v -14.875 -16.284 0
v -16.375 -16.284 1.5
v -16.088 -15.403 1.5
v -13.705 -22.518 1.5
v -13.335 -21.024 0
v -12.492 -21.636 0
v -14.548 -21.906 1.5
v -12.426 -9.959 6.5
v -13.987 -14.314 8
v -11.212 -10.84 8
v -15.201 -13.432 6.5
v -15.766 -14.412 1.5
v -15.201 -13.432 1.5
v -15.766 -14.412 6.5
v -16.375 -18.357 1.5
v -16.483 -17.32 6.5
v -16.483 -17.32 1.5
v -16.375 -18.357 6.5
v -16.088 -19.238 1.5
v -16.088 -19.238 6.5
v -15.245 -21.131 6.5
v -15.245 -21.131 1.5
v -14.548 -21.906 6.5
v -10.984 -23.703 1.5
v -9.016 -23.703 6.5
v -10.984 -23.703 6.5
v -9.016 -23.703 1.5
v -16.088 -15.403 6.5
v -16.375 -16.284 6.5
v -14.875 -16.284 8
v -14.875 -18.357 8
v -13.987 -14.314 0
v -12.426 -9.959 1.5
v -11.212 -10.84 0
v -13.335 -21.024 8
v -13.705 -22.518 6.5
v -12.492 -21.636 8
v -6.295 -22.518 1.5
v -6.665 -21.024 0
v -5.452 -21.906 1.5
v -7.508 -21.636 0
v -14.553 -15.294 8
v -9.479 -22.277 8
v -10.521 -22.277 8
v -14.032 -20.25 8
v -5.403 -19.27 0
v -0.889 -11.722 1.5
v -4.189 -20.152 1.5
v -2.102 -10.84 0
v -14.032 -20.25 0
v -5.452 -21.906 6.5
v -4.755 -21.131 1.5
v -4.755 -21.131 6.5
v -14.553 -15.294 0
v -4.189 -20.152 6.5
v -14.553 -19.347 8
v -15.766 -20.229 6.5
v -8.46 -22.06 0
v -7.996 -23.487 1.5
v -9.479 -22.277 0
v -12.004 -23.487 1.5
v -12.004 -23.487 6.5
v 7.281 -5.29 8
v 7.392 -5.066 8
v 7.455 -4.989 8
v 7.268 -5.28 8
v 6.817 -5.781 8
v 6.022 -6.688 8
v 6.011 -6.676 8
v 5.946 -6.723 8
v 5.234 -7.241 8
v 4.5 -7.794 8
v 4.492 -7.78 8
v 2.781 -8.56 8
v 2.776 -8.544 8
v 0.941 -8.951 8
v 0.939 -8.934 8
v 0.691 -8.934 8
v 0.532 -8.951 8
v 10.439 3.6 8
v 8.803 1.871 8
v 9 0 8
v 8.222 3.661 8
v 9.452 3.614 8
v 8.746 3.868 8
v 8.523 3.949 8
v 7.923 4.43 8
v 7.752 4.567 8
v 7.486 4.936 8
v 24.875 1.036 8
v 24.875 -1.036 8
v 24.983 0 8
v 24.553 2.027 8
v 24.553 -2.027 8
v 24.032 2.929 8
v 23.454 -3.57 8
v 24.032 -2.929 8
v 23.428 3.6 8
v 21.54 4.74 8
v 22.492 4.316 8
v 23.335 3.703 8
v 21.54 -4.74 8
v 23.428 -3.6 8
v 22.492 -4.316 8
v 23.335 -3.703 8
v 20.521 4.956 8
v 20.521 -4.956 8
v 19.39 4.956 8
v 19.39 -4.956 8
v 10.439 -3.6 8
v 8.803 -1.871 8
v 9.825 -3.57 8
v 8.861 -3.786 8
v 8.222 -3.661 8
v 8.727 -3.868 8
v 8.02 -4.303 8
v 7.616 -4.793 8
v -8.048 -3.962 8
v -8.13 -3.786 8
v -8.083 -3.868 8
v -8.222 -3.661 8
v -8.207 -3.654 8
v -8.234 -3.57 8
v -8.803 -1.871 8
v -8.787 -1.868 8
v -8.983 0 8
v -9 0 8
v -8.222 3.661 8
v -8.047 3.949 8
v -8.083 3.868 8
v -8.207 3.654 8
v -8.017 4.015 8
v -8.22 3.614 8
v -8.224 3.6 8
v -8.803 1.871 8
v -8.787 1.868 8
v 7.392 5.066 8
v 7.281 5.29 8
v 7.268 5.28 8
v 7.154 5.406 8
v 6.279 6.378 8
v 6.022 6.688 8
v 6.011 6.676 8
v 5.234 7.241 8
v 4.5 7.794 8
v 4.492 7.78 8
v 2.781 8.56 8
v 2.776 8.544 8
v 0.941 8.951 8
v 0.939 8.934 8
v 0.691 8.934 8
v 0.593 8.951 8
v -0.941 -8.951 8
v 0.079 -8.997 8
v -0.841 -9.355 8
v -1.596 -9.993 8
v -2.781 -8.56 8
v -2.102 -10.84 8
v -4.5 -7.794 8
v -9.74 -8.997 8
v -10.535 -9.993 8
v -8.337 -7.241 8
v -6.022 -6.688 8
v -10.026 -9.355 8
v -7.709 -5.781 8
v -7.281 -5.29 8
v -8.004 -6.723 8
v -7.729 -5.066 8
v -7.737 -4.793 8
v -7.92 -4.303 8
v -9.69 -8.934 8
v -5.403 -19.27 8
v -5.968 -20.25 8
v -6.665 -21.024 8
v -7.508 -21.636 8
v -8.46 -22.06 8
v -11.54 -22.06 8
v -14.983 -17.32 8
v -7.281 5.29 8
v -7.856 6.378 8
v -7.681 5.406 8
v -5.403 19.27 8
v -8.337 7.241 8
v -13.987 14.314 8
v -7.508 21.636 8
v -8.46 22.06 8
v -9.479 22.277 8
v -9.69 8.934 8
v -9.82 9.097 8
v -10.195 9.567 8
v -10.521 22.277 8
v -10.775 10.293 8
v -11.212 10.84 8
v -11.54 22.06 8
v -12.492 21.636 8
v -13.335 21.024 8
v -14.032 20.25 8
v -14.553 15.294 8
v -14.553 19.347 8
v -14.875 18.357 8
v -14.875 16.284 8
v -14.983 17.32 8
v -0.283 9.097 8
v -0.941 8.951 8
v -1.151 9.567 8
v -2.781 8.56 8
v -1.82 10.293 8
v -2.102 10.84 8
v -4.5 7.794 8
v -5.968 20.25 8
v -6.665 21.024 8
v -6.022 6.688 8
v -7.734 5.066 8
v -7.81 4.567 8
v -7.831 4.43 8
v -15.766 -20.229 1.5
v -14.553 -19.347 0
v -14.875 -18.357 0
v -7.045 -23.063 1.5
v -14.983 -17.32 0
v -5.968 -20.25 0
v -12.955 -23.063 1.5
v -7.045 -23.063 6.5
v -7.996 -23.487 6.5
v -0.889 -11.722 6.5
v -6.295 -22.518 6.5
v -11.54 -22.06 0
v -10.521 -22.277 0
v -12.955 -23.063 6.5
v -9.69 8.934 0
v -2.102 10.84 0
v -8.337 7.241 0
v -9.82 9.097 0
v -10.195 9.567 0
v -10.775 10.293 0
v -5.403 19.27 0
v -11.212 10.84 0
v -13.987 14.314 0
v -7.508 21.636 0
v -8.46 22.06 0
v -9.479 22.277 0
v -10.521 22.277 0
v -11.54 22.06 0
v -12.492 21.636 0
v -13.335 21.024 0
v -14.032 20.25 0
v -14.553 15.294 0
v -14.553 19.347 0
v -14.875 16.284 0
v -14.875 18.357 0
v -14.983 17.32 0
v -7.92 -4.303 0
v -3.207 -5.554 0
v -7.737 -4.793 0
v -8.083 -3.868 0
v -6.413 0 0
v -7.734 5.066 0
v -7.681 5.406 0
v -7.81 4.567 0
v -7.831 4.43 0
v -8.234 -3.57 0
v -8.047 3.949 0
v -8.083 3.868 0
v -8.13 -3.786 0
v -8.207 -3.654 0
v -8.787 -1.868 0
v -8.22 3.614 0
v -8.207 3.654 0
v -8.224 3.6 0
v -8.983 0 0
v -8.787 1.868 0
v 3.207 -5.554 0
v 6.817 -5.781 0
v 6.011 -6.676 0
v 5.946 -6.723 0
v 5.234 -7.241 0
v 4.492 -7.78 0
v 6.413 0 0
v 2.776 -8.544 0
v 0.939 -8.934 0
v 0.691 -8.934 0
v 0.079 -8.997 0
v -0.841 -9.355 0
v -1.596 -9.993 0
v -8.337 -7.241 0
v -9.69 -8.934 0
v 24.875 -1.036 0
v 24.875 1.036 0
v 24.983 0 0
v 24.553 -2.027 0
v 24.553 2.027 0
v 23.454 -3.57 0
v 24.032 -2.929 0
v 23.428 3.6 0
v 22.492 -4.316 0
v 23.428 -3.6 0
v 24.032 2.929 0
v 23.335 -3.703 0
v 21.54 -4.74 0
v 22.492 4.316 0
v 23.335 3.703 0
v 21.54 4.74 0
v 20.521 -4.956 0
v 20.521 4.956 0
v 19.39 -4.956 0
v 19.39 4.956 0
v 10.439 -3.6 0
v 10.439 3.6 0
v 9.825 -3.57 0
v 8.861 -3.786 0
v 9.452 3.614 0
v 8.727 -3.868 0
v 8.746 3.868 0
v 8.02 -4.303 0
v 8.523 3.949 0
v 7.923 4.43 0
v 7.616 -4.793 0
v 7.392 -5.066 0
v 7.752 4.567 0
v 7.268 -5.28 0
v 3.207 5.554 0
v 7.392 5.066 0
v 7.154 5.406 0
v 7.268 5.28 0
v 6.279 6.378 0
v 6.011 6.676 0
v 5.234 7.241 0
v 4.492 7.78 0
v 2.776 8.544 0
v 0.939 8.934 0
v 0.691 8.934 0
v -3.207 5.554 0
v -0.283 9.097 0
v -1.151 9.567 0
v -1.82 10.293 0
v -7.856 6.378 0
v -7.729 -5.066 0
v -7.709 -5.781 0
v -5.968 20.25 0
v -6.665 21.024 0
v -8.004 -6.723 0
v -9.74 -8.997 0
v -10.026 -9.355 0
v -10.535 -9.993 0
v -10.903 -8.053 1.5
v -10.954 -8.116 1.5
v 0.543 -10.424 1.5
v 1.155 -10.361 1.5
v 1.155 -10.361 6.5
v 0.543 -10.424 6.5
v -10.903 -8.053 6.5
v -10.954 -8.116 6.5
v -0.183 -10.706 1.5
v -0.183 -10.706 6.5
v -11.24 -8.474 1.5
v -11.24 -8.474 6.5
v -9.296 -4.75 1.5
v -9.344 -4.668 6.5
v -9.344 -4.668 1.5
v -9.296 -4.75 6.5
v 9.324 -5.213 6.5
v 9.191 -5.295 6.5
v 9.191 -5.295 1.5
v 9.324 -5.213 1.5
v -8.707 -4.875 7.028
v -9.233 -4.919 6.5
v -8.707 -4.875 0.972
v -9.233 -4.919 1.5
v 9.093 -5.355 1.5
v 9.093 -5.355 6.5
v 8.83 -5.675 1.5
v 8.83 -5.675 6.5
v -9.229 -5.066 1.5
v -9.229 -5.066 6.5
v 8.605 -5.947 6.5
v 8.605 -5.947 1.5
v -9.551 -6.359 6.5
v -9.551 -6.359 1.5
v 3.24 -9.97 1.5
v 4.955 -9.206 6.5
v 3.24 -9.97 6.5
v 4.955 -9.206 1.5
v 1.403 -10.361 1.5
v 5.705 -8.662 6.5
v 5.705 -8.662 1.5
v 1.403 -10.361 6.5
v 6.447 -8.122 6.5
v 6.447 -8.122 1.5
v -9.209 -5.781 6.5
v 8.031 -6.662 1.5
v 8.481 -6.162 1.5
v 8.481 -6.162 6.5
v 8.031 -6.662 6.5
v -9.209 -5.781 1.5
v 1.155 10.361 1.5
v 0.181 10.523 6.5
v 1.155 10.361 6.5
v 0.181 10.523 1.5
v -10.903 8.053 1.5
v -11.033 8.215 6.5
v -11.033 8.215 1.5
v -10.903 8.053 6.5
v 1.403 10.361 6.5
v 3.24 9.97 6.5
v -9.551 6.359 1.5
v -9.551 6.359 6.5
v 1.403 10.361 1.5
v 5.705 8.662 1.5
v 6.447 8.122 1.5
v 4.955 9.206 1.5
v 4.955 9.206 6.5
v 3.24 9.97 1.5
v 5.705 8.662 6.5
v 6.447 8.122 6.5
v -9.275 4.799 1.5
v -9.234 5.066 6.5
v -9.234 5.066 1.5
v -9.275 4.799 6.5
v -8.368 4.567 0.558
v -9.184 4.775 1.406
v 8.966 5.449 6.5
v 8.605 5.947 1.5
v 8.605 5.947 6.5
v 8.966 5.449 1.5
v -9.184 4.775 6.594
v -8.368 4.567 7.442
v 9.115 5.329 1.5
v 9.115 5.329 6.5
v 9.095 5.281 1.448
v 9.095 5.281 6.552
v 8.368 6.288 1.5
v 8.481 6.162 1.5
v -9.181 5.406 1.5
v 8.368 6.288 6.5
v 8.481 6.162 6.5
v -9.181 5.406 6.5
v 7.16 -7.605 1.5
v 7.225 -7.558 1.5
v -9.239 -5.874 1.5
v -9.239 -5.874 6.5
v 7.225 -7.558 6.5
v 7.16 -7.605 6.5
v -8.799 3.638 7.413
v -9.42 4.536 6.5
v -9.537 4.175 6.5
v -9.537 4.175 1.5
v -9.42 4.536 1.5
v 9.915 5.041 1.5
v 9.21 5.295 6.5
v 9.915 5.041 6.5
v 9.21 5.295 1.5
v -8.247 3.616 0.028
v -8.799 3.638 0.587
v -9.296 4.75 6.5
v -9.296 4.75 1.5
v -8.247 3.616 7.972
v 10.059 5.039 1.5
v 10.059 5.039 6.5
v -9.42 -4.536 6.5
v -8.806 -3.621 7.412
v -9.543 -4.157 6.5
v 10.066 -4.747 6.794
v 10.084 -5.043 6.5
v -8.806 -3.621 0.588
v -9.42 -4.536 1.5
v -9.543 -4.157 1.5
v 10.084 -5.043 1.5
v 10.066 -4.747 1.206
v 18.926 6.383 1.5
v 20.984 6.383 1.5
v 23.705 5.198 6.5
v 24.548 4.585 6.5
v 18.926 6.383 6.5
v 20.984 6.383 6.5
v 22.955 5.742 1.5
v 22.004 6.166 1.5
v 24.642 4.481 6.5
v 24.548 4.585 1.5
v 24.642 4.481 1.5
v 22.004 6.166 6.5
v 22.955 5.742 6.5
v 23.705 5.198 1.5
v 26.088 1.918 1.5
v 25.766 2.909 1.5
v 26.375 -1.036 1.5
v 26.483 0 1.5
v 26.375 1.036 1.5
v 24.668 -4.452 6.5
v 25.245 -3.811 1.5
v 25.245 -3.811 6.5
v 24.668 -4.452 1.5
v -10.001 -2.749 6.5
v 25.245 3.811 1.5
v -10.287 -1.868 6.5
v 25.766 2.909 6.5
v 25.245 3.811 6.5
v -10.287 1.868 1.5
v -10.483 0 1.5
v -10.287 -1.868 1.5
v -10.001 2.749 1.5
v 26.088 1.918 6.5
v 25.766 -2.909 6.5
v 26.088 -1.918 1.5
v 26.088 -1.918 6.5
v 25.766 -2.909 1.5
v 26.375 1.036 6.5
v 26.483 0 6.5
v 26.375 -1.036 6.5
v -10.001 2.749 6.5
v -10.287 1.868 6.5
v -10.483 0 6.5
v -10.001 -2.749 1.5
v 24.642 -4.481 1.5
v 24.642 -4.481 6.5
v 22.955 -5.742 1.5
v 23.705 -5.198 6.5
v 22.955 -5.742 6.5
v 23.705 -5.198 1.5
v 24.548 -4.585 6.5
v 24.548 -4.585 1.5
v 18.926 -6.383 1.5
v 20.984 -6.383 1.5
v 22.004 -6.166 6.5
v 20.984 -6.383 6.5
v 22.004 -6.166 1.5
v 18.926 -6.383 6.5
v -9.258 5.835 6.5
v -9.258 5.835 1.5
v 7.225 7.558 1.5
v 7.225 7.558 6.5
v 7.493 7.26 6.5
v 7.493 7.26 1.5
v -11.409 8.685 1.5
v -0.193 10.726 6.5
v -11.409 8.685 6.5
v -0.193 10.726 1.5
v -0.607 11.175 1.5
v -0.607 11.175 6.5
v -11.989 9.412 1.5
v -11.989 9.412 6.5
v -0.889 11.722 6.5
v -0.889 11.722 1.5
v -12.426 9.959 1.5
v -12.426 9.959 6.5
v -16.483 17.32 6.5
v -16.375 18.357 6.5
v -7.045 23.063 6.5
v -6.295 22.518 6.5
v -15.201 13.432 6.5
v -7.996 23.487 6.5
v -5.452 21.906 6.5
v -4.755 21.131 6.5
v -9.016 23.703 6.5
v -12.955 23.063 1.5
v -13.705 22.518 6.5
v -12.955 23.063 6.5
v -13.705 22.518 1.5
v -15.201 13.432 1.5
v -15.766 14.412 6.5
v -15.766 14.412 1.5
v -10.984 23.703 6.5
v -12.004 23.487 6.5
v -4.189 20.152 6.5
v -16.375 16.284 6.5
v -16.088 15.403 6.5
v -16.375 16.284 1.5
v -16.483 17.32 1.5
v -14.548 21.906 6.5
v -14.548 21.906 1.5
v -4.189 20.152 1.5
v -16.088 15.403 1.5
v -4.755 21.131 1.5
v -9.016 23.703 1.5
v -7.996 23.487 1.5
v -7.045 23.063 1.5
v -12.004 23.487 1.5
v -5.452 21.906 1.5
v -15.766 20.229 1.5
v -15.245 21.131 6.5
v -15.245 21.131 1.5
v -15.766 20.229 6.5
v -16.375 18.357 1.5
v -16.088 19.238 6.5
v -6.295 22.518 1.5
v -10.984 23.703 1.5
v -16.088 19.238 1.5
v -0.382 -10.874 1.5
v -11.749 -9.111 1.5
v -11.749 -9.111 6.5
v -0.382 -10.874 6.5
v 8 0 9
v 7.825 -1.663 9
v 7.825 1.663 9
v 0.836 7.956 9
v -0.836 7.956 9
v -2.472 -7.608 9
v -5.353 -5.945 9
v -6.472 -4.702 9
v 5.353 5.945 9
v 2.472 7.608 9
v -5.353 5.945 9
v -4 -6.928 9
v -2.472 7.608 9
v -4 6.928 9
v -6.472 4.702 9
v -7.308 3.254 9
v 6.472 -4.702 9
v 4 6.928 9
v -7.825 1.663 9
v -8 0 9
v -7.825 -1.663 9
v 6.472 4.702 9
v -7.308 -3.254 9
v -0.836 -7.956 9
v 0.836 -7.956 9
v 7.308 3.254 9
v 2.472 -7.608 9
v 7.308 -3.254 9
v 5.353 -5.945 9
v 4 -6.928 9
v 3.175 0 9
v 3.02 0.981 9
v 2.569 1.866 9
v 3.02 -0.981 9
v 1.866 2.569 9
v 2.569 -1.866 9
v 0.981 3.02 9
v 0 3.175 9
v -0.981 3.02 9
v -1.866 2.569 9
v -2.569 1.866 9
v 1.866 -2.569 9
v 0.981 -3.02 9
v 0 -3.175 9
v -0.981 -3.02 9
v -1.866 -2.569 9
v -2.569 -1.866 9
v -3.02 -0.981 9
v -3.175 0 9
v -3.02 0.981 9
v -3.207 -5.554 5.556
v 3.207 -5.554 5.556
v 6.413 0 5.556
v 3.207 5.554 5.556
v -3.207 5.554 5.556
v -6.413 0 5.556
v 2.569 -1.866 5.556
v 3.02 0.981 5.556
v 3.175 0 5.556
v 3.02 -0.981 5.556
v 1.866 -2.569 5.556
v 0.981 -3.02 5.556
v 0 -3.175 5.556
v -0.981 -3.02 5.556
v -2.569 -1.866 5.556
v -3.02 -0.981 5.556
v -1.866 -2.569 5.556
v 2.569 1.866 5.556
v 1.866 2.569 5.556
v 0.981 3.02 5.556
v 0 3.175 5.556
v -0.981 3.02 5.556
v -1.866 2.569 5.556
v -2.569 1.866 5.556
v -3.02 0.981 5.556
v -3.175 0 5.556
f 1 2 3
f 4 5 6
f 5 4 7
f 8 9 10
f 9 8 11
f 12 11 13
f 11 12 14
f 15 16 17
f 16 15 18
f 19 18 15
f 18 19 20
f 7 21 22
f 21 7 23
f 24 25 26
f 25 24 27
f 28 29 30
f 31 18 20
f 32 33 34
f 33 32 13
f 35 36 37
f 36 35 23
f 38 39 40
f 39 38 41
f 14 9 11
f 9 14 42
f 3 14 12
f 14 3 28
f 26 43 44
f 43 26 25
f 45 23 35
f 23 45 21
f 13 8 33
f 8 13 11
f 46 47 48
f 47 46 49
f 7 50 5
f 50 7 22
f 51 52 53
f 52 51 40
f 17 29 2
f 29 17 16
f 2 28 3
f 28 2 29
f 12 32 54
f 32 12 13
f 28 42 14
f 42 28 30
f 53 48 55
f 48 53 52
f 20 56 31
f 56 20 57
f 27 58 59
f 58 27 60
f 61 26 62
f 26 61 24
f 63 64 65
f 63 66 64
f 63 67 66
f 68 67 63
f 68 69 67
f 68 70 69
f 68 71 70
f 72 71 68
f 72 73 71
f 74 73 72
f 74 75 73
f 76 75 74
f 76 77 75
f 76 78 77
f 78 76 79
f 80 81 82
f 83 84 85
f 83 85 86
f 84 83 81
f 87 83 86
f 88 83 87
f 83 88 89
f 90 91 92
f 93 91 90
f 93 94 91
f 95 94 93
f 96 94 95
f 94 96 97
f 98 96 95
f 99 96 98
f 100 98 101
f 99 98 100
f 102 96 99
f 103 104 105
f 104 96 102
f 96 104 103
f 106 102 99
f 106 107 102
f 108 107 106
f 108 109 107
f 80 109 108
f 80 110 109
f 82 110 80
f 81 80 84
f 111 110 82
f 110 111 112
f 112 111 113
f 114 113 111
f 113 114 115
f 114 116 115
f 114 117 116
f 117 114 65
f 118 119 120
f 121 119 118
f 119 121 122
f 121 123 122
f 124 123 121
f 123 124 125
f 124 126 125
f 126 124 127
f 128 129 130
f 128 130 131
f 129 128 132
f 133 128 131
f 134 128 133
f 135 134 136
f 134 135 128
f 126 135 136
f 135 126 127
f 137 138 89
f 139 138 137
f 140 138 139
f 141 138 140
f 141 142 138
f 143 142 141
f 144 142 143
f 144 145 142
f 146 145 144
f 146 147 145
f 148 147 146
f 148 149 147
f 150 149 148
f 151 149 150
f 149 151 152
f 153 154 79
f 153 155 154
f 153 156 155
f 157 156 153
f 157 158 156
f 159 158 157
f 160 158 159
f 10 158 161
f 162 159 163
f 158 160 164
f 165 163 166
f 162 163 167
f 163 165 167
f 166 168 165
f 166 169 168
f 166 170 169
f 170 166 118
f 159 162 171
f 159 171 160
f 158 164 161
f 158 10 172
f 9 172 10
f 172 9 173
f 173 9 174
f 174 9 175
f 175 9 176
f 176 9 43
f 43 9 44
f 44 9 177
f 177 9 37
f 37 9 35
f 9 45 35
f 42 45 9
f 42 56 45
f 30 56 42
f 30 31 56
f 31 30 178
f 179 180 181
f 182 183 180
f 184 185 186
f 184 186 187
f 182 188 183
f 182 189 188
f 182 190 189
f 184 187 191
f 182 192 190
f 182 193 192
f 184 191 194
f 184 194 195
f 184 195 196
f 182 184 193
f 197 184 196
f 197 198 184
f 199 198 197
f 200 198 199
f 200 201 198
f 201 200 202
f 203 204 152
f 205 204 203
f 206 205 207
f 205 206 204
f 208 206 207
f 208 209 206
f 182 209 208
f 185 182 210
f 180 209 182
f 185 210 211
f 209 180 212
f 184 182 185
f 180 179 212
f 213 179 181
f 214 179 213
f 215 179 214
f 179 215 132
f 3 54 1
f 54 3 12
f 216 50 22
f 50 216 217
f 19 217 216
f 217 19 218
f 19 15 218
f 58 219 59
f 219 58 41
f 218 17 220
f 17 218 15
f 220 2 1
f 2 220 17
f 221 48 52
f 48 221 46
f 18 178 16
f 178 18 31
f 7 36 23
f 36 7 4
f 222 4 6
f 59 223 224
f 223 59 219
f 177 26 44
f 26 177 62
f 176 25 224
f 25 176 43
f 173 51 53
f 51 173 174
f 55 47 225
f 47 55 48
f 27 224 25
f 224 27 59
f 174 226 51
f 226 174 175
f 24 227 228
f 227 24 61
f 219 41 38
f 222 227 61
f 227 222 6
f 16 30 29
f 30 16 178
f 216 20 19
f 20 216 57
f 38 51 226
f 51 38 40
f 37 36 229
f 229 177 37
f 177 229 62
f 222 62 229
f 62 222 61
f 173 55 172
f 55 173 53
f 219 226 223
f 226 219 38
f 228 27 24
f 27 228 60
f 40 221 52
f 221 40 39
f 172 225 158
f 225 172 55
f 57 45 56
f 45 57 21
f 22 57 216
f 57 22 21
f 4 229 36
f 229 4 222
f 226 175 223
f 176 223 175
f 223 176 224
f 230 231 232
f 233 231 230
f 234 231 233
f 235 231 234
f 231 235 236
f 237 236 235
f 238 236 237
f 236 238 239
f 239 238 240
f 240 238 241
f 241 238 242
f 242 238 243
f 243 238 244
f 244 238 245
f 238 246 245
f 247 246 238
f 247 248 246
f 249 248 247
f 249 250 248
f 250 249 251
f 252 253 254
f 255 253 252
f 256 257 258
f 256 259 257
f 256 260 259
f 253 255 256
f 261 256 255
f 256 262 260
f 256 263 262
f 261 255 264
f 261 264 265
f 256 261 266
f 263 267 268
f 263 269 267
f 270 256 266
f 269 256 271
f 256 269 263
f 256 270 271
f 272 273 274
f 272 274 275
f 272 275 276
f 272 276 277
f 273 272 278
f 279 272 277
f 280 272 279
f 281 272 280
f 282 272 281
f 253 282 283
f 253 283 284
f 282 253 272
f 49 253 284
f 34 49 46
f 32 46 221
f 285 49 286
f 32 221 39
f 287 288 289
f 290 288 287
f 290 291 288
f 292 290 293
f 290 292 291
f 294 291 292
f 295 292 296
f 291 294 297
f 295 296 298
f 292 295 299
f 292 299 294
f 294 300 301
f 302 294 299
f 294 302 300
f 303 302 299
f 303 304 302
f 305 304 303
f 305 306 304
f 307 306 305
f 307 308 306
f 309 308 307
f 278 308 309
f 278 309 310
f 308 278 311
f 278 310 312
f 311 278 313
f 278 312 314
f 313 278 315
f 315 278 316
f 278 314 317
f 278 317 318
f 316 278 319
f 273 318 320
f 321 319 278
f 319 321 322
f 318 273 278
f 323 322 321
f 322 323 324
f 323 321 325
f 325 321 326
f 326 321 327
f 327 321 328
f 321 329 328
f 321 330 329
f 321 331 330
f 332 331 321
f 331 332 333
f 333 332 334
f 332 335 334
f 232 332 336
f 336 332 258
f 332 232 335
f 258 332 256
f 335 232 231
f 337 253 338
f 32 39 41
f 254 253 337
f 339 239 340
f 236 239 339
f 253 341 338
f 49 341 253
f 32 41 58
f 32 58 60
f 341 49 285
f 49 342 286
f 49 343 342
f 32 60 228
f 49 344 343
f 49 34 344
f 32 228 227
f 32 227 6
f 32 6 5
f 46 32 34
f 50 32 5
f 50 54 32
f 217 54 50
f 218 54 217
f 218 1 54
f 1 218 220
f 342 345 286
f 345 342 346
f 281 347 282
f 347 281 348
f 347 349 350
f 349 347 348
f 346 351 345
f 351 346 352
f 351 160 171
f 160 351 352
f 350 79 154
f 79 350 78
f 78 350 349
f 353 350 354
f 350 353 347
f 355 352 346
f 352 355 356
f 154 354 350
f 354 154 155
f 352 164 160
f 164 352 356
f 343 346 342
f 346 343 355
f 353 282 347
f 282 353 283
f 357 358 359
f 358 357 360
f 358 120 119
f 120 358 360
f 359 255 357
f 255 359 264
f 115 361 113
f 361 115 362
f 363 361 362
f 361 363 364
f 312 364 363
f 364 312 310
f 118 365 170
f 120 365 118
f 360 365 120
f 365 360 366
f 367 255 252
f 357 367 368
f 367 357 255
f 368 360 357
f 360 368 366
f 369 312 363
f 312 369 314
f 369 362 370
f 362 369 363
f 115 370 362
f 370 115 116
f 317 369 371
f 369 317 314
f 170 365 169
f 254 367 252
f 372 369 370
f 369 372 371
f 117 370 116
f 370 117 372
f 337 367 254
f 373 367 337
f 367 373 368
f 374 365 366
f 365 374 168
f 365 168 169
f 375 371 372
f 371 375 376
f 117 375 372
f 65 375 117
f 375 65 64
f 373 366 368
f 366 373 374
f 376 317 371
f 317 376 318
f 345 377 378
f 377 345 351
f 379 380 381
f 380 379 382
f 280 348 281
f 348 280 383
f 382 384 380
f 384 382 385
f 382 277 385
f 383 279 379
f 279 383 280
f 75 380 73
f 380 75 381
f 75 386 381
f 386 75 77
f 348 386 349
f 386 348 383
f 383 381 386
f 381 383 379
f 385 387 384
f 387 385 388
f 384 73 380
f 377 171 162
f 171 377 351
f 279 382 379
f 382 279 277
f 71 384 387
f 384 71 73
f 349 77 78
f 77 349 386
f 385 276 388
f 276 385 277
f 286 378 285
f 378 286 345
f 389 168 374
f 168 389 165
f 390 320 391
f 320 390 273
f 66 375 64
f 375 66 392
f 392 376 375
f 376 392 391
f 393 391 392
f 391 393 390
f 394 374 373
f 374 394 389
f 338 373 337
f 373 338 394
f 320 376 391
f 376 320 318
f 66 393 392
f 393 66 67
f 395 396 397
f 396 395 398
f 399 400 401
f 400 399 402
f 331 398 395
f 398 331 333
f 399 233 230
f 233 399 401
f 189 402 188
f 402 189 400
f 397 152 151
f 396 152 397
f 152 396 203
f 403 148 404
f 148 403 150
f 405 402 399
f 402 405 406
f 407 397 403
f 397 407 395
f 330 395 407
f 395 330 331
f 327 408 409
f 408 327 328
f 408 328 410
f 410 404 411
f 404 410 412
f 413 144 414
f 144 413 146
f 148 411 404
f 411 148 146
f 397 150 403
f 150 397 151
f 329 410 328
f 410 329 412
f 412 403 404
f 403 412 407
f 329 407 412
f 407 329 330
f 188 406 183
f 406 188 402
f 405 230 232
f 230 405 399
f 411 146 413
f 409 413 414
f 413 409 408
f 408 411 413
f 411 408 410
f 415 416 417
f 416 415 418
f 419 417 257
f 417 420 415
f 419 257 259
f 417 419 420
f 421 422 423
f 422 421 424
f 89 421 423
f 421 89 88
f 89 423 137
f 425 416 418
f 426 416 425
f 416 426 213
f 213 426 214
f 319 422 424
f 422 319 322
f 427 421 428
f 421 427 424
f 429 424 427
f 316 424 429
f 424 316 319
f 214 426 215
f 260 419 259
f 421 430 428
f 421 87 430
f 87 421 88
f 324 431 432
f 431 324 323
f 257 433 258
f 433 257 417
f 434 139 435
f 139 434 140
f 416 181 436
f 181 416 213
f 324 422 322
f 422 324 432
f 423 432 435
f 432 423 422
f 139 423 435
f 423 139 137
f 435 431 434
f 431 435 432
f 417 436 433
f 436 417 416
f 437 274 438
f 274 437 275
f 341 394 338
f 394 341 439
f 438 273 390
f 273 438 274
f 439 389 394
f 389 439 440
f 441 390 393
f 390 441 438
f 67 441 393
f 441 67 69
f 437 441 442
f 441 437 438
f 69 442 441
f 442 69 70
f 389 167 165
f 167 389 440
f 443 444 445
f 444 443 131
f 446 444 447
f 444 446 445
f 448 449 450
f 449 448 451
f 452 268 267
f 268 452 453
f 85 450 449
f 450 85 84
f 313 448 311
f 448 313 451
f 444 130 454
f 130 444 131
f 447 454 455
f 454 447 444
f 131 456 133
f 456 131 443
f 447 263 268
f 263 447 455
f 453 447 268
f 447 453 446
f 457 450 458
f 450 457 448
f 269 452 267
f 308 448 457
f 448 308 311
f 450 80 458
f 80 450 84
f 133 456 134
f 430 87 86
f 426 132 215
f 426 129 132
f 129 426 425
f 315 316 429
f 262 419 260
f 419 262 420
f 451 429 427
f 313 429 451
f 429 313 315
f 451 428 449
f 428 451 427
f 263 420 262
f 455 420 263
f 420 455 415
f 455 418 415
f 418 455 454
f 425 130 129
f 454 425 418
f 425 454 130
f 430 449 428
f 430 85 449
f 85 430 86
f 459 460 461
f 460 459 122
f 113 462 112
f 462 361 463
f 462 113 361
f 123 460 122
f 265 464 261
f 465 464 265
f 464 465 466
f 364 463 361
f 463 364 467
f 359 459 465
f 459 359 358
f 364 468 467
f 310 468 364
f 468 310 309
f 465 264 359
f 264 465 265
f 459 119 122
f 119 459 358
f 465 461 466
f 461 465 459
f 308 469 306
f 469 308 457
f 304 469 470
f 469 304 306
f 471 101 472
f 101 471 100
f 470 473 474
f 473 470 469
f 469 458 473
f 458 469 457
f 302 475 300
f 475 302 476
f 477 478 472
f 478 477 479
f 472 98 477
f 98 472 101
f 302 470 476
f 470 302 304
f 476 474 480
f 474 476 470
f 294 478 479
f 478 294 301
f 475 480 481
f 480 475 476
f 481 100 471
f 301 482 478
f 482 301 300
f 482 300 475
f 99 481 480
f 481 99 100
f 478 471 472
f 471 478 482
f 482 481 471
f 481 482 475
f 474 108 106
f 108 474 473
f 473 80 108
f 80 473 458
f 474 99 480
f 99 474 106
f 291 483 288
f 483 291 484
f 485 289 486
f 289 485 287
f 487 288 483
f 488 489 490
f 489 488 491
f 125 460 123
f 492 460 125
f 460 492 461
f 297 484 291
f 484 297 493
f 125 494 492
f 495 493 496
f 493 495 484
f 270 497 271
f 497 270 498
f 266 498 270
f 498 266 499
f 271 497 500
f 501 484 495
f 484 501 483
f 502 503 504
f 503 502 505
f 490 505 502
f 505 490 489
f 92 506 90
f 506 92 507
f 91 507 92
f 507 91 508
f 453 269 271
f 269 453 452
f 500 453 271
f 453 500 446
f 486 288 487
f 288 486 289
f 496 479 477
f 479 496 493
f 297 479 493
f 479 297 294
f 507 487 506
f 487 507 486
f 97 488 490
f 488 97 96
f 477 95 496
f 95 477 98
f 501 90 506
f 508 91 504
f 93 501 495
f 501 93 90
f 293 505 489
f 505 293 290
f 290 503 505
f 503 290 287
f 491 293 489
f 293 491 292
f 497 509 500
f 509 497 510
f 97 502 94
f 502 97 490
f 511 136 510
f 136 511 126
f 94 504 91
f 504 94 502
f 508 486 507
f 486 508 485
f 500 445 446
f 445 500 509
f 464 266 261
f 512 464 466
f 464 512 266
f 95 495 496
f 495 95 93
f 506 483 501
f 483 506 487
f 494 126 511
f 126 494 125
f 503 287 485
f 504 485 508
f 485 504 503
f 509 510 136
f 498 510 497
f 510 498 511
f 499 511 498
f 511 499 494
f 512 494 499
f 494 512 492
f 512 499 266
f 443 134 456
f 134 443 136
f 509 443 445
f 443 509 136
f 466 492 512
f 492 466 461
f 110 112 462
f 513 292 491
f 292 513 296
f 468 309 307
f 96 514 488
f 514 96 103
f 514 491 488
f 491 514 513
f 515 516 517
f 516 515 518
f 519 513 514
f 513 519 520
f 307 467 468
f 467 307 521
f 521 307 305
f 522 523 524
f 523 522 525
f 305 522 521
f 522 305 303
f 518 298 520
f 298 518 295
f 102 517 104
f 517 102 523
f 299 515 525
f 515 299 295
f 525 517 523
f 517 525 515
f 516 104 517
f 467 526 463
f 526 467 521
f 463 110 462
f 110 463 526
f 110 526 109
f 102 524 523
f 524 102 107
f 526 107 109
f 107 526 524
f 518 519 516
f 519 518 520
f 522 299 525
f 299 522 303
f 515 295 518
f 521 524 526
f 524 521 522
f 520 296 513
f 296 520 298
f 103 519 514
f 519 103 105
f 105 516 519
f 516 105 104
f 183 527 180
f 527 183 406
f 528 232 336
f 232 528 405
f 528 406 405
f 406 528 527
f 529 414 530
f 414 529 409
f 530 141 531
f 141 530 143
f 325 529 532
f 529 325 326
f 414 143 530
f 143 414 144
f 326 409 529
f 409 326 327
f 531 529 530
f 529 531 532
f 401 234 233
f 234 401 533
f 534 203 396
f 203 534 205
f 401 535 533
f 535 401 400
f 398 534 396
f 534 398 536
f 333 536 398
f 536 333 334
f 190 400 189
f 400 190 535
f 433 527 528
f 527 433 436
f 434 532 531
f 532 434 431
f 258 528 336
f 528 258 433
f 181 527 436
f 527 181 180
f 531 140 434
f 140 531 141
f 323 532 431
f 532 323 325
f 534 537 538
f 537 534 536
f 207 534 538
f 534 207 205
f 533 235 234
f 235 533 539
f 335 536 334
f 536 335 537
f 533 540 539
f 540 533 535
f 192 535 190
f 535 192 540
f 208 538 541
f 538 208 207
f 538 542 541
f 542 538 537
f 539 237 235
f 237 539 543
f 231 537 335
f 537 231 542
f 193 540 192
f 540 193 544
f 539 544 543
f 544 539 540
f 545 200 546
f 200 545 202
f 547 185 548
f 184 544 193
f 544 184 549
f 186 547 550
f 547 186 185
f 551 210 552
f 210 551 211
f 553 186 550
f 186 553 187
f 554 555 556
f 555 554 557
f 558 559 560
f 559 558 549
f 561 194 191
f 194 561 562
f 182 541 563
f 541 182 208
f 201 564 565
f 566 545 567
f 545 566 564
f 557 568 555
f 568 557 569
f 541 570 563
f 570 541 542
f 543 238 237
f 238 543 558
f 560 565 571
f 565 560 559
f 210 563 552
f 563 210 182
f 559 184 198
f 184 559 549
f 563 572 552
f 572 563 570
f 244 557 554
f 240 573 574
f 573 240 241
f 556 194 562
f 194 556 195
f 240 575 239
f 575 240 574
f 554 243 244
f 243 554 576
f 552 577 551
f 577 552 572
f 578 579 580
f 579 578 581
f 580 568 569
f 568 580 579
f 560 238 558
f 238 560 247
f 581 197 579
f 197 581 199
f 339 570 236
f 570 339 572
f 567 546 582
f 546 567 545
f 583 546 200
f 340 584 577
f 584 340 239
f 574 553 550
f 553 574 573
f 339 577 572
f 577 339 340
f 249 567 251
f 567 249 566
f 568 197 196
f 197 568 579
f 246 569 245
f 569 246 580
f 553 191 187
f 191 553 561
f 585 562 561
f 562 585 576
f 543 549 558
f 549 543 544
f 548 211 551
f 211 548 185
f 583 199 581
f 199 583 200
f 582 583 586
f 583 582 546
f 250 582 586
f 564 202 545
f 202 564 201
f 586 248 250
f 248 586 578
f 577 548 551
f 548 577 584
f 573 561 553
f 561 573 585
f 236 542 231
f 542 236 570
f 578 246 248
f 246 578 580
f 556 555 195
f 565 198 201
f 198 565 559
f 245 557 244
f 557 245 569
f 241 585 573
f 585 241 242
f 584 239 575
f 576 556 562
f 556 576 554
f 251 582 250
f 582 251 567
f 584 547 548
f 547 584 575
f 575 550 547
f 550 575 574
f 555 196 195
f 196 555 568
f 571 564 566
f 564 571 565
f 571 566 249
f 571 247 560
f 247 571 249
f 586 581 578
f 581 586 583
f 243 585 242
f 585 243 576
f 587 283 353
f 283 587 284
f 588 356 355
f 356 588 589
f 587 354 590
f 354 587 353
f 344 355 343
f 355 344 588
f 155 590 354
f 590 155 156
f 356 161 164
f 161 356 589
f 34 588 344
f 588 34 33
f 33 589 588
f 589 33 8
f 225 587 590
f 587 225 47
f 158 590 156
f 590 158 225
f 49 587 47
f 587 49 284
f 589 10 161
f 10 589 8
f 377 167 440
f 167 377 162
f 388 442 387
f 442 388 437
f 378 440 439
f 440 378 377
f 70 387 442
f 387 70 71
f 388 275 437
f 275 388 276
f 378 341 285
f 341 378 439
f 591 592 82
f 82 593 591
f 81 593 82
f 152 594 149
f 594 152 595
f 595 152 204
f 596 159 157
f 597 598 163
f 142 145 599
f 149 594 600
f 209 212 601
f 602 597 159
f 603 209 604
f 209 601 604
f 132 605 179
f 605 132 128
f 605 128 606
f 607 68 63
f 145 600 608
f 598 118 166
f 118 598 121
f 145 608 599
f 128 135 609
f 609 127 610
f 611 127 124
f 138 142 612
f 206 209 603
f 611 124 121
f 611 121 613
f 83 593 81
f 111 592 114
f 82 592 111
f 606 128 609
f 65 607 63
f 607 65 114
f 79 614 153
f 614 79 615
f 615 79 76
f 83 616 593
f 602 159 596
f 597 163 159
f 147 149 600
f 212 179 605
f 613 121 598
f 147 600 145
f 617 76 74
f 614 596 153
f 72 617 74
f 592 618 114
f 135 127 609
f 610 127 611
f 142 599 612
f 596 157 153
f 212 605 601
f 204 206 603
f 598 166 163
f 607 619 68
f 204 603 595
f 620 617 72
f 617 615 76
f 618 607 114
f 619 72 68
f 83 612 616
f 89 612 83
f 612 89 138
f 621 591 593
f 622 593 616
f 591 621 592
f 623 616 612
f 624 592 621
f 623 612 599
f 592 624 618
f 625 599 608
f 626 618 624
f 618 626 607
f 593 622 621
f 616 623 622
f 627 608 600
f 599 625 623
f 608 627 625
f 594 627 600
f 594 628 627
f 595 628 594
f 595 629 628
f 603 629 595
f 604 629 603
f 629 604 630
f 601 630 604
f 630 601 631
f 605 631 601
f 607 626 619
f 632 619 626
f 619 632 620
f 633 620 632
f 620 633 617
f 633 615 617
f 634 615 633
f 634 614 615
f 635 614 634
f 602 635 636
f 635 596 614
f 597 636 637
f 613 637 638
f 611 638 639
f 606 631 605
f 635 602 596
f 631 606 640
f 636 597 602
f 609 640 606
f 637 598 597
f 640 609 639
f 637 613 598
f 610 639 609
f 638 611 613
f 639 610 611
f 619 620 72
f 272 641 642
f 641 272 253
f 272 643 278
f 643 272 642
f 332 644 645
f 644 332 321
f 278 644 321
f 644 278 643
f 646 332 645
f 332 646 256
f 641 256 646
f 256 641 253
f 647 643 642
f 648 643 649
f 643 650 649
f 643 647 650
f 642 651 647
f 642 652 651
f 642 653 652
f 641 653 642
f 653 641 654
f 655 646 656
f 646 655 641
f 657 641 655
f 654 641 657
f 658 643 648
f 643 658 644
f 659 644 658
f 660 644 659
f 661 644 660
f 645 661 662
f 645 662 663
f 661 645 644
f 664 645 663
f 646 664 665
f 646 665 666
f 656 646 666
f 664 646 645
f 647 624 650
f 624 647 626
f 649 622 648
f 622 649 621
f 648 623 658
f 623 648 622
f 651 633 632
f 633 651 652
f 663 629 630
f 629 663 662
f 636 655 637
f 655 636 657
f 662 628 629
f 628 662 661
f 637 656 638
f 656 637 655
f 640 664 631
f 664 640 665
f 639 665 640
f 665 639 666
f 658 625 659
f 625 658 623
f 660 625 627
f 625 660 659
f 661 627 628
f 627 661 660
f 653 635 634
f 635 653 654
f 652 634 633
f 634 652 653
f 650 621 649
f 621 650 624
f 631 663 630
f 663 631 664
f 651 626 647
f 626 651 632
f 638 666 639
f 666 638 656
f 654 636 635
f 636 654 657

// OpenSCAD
$fs = 1 * 1; // Times one to hide them from Customizer
mm = 25.4 * 1; // Times one to hide them from Customizer

// Parametric values for Thingiverse Customizer

// Nut / bolt size, 1/4"-1/2" SAE, M5-M12 metric
size = 1; // [1:1/4",2:5/16",3:3/8",4:7/16",5:1/2",6:M5,7:M6,8:M8,9:M10,10:M12]

// Nubs
nubs = 3; // [1:6]

// Knob Outer Radius (mm)
knob_outer_radius = 25; //[10:75]

// Hub Radius (mm)
hub_radius = 12; // [10:75]

// Outer Radius of Nubs (mm)
handle_outer_radius = 8; // [0:50]

// Inner Radius of Nubs (defines taper)
handle_inner_radius = 5; // [0:50]

// Knob Thickness (mm)
handle_thickness = 8; // [1:25]

// Chamfer (mm)
handle_chamfer = 1.5; // [0:0.5:5]

// Boss Thickness (mm)
boss_thickness = 1; // [0:0.5:25]

// Boss Radius (mm)
boss_radius = 9; // [0:75]

// Boss Chamfer (mm)
boss_chamfer = 1; // [0:0.5:10]

// Slop (mm)
slop = 0; // [-2:0.1:2]

nut_rad = 0.505 * mm / 2;
nut_height = 7/32 * mm;
thread_rad = 0.25 * mm / 2;

module knockout(nut_rad, slop, nut_height, thread_rad, handle_thickness, boss_thickness) {
    translate([0,0,-0.5]) cylinder(r = nut_rad + slop, h = nut_height + slop + 0.5, $fn = 6);
    translate([0,0,-0.5]) cylinder(r = thread_rad + slop, h = handle_thickness + boss_thickness + 1);
}

difference(){ // for when we remove the 
    union(){
        translate([0, 0, handle_chamfer]) minkowski(){
            linear_extrude(height = handle_thickness - (handle_chamfer * 2)) {
                offset(r = -1 * 3) {
                    union() {
                        for (rot = [0:nubs - 1]) {
                            rotate([0, 0, rot * 360 / nubs])
                            hull() {
                                translate([knob_outer_radius - handle_inner_radius, 0, 0]) circle(r = handle_outer_radius);
                                circle(r = handle_inner_radius);
                            }
                        }
                        circle(r =  hub_radius);
                    }
                }
            }
            union (){  // basically a vertical cone and an upside-down cone, to make the chamfer.
                cylinder(r1 = handle_chamfer, r2 = 0, h = handle_chamfer);
                rotate([180, 0, 0]) cylinder(r1 = handle_chamfer, r2 = 0, h = handle_chamfer);
            }
        }
        translate([0, 0, handle_thickness]) cylinder(r = boss_radius, h = (boss_thickness - boss_chamfer));
        translate([0, 0, handle_thickness + (boss_thickness - boss_chamfer)]) cylinder(r1 = boss_radius, r2 = (boss_radius - boss_chamfer), h = boss_chamfer);
    }
        
    if (size == 1) { // 1/4"
        nut_rad = 0.505 * mm / 2;
        nut_height = 7/32 * mm;
        thread_rad = 0.25 * mm / 2;
        knockout(nut_rad, slop, nut_height, thread_rad, handle_thickness, boss_thickness);
    }
    
    if (size == 2) { // 5/16"
        nut_rad = 0.577 * mm / 2;
        nut_height = 17/64 * mm;
        thread_rad = 0.3125 * mm / 2;
        knockout(nut_rad, slop, nut_height, thread_rad, handle_thickness, boss_thickness);
    }

    if (size == 3) { // 3/8"
        nut_rad = 0.650 * mm / 2;
        nut_height = 21/64 * mm;
        thread_rad = 0.375 * mm / 2;
        knockout(nut_rad, slop, nut_height, thread_rad, handle_thickness, boss_thickness);
    }
    
    if (size == 4) { // 7/16"
        nut_rad = 0.794 * mm / 2;
        nut_height = 3/8 * mm;
        thread_rad = 0.4375 * mm / 2;
        knockout(nut_rad, slop, nut_height, thread_rad, handle_thickness, boss_thickness);
    }
 
    if (size == 5) { // 1/2"
        nut_rad = 0.866 * mm / 2;
        nut_height = 7/16 * mm;
        thread_rad = 0.5 * mm / 2;
        knockout(nut_rad, slop, nut_height, thread_rad, handle_thickness, boss_thickness);
    }

    if (size == 6) { // M5
        nut_rad = 9.24 / 2;
        nut_height = 3.65;
        thread_rad = 2.5;
        knockout(nut_rad, slop, nut_height, thread_rad, handle_thickness, boss_thickness);
    }

    if (size == 7) { // M6
        nut_rad = 11.55 / 2;
        nut_height = 4.15;
        thread_rad = 5;
        knockout(nut_rad, slop, nut_height, thread_rad, handle_thickness, boss_thickness);
    }

    if (size == 8) { // M8
        nut_rad = 15.01 / 2;
        nut_height = 5.5;
        thread_rad = 4;
        knockout(nut_rad, slop, nut_height, thread_rad, handle_thickness, boss_thickness);
    }

    if (size == 9) { // M10
        nut_rad = 18.48 / 2;
        nut_height = 6.63;
        thread_rad = 5;
        knockout(nut_rad, slop, nut_height, thread_rad, handle_thickness, boss_thickness);
    }

    if (size == 10) { // M12
        nut_rad = 20.78 / 2;
        nut_height = 7.76;
        thread_rad = 6;
        knockout(nut_rad, slop, nut_height, thread_rad, handle_thickness, boss_thickness);
    }
}

//#translate([0, 0, -10]) cylinder(r=0.505 / 2 * mm, h = 30);
